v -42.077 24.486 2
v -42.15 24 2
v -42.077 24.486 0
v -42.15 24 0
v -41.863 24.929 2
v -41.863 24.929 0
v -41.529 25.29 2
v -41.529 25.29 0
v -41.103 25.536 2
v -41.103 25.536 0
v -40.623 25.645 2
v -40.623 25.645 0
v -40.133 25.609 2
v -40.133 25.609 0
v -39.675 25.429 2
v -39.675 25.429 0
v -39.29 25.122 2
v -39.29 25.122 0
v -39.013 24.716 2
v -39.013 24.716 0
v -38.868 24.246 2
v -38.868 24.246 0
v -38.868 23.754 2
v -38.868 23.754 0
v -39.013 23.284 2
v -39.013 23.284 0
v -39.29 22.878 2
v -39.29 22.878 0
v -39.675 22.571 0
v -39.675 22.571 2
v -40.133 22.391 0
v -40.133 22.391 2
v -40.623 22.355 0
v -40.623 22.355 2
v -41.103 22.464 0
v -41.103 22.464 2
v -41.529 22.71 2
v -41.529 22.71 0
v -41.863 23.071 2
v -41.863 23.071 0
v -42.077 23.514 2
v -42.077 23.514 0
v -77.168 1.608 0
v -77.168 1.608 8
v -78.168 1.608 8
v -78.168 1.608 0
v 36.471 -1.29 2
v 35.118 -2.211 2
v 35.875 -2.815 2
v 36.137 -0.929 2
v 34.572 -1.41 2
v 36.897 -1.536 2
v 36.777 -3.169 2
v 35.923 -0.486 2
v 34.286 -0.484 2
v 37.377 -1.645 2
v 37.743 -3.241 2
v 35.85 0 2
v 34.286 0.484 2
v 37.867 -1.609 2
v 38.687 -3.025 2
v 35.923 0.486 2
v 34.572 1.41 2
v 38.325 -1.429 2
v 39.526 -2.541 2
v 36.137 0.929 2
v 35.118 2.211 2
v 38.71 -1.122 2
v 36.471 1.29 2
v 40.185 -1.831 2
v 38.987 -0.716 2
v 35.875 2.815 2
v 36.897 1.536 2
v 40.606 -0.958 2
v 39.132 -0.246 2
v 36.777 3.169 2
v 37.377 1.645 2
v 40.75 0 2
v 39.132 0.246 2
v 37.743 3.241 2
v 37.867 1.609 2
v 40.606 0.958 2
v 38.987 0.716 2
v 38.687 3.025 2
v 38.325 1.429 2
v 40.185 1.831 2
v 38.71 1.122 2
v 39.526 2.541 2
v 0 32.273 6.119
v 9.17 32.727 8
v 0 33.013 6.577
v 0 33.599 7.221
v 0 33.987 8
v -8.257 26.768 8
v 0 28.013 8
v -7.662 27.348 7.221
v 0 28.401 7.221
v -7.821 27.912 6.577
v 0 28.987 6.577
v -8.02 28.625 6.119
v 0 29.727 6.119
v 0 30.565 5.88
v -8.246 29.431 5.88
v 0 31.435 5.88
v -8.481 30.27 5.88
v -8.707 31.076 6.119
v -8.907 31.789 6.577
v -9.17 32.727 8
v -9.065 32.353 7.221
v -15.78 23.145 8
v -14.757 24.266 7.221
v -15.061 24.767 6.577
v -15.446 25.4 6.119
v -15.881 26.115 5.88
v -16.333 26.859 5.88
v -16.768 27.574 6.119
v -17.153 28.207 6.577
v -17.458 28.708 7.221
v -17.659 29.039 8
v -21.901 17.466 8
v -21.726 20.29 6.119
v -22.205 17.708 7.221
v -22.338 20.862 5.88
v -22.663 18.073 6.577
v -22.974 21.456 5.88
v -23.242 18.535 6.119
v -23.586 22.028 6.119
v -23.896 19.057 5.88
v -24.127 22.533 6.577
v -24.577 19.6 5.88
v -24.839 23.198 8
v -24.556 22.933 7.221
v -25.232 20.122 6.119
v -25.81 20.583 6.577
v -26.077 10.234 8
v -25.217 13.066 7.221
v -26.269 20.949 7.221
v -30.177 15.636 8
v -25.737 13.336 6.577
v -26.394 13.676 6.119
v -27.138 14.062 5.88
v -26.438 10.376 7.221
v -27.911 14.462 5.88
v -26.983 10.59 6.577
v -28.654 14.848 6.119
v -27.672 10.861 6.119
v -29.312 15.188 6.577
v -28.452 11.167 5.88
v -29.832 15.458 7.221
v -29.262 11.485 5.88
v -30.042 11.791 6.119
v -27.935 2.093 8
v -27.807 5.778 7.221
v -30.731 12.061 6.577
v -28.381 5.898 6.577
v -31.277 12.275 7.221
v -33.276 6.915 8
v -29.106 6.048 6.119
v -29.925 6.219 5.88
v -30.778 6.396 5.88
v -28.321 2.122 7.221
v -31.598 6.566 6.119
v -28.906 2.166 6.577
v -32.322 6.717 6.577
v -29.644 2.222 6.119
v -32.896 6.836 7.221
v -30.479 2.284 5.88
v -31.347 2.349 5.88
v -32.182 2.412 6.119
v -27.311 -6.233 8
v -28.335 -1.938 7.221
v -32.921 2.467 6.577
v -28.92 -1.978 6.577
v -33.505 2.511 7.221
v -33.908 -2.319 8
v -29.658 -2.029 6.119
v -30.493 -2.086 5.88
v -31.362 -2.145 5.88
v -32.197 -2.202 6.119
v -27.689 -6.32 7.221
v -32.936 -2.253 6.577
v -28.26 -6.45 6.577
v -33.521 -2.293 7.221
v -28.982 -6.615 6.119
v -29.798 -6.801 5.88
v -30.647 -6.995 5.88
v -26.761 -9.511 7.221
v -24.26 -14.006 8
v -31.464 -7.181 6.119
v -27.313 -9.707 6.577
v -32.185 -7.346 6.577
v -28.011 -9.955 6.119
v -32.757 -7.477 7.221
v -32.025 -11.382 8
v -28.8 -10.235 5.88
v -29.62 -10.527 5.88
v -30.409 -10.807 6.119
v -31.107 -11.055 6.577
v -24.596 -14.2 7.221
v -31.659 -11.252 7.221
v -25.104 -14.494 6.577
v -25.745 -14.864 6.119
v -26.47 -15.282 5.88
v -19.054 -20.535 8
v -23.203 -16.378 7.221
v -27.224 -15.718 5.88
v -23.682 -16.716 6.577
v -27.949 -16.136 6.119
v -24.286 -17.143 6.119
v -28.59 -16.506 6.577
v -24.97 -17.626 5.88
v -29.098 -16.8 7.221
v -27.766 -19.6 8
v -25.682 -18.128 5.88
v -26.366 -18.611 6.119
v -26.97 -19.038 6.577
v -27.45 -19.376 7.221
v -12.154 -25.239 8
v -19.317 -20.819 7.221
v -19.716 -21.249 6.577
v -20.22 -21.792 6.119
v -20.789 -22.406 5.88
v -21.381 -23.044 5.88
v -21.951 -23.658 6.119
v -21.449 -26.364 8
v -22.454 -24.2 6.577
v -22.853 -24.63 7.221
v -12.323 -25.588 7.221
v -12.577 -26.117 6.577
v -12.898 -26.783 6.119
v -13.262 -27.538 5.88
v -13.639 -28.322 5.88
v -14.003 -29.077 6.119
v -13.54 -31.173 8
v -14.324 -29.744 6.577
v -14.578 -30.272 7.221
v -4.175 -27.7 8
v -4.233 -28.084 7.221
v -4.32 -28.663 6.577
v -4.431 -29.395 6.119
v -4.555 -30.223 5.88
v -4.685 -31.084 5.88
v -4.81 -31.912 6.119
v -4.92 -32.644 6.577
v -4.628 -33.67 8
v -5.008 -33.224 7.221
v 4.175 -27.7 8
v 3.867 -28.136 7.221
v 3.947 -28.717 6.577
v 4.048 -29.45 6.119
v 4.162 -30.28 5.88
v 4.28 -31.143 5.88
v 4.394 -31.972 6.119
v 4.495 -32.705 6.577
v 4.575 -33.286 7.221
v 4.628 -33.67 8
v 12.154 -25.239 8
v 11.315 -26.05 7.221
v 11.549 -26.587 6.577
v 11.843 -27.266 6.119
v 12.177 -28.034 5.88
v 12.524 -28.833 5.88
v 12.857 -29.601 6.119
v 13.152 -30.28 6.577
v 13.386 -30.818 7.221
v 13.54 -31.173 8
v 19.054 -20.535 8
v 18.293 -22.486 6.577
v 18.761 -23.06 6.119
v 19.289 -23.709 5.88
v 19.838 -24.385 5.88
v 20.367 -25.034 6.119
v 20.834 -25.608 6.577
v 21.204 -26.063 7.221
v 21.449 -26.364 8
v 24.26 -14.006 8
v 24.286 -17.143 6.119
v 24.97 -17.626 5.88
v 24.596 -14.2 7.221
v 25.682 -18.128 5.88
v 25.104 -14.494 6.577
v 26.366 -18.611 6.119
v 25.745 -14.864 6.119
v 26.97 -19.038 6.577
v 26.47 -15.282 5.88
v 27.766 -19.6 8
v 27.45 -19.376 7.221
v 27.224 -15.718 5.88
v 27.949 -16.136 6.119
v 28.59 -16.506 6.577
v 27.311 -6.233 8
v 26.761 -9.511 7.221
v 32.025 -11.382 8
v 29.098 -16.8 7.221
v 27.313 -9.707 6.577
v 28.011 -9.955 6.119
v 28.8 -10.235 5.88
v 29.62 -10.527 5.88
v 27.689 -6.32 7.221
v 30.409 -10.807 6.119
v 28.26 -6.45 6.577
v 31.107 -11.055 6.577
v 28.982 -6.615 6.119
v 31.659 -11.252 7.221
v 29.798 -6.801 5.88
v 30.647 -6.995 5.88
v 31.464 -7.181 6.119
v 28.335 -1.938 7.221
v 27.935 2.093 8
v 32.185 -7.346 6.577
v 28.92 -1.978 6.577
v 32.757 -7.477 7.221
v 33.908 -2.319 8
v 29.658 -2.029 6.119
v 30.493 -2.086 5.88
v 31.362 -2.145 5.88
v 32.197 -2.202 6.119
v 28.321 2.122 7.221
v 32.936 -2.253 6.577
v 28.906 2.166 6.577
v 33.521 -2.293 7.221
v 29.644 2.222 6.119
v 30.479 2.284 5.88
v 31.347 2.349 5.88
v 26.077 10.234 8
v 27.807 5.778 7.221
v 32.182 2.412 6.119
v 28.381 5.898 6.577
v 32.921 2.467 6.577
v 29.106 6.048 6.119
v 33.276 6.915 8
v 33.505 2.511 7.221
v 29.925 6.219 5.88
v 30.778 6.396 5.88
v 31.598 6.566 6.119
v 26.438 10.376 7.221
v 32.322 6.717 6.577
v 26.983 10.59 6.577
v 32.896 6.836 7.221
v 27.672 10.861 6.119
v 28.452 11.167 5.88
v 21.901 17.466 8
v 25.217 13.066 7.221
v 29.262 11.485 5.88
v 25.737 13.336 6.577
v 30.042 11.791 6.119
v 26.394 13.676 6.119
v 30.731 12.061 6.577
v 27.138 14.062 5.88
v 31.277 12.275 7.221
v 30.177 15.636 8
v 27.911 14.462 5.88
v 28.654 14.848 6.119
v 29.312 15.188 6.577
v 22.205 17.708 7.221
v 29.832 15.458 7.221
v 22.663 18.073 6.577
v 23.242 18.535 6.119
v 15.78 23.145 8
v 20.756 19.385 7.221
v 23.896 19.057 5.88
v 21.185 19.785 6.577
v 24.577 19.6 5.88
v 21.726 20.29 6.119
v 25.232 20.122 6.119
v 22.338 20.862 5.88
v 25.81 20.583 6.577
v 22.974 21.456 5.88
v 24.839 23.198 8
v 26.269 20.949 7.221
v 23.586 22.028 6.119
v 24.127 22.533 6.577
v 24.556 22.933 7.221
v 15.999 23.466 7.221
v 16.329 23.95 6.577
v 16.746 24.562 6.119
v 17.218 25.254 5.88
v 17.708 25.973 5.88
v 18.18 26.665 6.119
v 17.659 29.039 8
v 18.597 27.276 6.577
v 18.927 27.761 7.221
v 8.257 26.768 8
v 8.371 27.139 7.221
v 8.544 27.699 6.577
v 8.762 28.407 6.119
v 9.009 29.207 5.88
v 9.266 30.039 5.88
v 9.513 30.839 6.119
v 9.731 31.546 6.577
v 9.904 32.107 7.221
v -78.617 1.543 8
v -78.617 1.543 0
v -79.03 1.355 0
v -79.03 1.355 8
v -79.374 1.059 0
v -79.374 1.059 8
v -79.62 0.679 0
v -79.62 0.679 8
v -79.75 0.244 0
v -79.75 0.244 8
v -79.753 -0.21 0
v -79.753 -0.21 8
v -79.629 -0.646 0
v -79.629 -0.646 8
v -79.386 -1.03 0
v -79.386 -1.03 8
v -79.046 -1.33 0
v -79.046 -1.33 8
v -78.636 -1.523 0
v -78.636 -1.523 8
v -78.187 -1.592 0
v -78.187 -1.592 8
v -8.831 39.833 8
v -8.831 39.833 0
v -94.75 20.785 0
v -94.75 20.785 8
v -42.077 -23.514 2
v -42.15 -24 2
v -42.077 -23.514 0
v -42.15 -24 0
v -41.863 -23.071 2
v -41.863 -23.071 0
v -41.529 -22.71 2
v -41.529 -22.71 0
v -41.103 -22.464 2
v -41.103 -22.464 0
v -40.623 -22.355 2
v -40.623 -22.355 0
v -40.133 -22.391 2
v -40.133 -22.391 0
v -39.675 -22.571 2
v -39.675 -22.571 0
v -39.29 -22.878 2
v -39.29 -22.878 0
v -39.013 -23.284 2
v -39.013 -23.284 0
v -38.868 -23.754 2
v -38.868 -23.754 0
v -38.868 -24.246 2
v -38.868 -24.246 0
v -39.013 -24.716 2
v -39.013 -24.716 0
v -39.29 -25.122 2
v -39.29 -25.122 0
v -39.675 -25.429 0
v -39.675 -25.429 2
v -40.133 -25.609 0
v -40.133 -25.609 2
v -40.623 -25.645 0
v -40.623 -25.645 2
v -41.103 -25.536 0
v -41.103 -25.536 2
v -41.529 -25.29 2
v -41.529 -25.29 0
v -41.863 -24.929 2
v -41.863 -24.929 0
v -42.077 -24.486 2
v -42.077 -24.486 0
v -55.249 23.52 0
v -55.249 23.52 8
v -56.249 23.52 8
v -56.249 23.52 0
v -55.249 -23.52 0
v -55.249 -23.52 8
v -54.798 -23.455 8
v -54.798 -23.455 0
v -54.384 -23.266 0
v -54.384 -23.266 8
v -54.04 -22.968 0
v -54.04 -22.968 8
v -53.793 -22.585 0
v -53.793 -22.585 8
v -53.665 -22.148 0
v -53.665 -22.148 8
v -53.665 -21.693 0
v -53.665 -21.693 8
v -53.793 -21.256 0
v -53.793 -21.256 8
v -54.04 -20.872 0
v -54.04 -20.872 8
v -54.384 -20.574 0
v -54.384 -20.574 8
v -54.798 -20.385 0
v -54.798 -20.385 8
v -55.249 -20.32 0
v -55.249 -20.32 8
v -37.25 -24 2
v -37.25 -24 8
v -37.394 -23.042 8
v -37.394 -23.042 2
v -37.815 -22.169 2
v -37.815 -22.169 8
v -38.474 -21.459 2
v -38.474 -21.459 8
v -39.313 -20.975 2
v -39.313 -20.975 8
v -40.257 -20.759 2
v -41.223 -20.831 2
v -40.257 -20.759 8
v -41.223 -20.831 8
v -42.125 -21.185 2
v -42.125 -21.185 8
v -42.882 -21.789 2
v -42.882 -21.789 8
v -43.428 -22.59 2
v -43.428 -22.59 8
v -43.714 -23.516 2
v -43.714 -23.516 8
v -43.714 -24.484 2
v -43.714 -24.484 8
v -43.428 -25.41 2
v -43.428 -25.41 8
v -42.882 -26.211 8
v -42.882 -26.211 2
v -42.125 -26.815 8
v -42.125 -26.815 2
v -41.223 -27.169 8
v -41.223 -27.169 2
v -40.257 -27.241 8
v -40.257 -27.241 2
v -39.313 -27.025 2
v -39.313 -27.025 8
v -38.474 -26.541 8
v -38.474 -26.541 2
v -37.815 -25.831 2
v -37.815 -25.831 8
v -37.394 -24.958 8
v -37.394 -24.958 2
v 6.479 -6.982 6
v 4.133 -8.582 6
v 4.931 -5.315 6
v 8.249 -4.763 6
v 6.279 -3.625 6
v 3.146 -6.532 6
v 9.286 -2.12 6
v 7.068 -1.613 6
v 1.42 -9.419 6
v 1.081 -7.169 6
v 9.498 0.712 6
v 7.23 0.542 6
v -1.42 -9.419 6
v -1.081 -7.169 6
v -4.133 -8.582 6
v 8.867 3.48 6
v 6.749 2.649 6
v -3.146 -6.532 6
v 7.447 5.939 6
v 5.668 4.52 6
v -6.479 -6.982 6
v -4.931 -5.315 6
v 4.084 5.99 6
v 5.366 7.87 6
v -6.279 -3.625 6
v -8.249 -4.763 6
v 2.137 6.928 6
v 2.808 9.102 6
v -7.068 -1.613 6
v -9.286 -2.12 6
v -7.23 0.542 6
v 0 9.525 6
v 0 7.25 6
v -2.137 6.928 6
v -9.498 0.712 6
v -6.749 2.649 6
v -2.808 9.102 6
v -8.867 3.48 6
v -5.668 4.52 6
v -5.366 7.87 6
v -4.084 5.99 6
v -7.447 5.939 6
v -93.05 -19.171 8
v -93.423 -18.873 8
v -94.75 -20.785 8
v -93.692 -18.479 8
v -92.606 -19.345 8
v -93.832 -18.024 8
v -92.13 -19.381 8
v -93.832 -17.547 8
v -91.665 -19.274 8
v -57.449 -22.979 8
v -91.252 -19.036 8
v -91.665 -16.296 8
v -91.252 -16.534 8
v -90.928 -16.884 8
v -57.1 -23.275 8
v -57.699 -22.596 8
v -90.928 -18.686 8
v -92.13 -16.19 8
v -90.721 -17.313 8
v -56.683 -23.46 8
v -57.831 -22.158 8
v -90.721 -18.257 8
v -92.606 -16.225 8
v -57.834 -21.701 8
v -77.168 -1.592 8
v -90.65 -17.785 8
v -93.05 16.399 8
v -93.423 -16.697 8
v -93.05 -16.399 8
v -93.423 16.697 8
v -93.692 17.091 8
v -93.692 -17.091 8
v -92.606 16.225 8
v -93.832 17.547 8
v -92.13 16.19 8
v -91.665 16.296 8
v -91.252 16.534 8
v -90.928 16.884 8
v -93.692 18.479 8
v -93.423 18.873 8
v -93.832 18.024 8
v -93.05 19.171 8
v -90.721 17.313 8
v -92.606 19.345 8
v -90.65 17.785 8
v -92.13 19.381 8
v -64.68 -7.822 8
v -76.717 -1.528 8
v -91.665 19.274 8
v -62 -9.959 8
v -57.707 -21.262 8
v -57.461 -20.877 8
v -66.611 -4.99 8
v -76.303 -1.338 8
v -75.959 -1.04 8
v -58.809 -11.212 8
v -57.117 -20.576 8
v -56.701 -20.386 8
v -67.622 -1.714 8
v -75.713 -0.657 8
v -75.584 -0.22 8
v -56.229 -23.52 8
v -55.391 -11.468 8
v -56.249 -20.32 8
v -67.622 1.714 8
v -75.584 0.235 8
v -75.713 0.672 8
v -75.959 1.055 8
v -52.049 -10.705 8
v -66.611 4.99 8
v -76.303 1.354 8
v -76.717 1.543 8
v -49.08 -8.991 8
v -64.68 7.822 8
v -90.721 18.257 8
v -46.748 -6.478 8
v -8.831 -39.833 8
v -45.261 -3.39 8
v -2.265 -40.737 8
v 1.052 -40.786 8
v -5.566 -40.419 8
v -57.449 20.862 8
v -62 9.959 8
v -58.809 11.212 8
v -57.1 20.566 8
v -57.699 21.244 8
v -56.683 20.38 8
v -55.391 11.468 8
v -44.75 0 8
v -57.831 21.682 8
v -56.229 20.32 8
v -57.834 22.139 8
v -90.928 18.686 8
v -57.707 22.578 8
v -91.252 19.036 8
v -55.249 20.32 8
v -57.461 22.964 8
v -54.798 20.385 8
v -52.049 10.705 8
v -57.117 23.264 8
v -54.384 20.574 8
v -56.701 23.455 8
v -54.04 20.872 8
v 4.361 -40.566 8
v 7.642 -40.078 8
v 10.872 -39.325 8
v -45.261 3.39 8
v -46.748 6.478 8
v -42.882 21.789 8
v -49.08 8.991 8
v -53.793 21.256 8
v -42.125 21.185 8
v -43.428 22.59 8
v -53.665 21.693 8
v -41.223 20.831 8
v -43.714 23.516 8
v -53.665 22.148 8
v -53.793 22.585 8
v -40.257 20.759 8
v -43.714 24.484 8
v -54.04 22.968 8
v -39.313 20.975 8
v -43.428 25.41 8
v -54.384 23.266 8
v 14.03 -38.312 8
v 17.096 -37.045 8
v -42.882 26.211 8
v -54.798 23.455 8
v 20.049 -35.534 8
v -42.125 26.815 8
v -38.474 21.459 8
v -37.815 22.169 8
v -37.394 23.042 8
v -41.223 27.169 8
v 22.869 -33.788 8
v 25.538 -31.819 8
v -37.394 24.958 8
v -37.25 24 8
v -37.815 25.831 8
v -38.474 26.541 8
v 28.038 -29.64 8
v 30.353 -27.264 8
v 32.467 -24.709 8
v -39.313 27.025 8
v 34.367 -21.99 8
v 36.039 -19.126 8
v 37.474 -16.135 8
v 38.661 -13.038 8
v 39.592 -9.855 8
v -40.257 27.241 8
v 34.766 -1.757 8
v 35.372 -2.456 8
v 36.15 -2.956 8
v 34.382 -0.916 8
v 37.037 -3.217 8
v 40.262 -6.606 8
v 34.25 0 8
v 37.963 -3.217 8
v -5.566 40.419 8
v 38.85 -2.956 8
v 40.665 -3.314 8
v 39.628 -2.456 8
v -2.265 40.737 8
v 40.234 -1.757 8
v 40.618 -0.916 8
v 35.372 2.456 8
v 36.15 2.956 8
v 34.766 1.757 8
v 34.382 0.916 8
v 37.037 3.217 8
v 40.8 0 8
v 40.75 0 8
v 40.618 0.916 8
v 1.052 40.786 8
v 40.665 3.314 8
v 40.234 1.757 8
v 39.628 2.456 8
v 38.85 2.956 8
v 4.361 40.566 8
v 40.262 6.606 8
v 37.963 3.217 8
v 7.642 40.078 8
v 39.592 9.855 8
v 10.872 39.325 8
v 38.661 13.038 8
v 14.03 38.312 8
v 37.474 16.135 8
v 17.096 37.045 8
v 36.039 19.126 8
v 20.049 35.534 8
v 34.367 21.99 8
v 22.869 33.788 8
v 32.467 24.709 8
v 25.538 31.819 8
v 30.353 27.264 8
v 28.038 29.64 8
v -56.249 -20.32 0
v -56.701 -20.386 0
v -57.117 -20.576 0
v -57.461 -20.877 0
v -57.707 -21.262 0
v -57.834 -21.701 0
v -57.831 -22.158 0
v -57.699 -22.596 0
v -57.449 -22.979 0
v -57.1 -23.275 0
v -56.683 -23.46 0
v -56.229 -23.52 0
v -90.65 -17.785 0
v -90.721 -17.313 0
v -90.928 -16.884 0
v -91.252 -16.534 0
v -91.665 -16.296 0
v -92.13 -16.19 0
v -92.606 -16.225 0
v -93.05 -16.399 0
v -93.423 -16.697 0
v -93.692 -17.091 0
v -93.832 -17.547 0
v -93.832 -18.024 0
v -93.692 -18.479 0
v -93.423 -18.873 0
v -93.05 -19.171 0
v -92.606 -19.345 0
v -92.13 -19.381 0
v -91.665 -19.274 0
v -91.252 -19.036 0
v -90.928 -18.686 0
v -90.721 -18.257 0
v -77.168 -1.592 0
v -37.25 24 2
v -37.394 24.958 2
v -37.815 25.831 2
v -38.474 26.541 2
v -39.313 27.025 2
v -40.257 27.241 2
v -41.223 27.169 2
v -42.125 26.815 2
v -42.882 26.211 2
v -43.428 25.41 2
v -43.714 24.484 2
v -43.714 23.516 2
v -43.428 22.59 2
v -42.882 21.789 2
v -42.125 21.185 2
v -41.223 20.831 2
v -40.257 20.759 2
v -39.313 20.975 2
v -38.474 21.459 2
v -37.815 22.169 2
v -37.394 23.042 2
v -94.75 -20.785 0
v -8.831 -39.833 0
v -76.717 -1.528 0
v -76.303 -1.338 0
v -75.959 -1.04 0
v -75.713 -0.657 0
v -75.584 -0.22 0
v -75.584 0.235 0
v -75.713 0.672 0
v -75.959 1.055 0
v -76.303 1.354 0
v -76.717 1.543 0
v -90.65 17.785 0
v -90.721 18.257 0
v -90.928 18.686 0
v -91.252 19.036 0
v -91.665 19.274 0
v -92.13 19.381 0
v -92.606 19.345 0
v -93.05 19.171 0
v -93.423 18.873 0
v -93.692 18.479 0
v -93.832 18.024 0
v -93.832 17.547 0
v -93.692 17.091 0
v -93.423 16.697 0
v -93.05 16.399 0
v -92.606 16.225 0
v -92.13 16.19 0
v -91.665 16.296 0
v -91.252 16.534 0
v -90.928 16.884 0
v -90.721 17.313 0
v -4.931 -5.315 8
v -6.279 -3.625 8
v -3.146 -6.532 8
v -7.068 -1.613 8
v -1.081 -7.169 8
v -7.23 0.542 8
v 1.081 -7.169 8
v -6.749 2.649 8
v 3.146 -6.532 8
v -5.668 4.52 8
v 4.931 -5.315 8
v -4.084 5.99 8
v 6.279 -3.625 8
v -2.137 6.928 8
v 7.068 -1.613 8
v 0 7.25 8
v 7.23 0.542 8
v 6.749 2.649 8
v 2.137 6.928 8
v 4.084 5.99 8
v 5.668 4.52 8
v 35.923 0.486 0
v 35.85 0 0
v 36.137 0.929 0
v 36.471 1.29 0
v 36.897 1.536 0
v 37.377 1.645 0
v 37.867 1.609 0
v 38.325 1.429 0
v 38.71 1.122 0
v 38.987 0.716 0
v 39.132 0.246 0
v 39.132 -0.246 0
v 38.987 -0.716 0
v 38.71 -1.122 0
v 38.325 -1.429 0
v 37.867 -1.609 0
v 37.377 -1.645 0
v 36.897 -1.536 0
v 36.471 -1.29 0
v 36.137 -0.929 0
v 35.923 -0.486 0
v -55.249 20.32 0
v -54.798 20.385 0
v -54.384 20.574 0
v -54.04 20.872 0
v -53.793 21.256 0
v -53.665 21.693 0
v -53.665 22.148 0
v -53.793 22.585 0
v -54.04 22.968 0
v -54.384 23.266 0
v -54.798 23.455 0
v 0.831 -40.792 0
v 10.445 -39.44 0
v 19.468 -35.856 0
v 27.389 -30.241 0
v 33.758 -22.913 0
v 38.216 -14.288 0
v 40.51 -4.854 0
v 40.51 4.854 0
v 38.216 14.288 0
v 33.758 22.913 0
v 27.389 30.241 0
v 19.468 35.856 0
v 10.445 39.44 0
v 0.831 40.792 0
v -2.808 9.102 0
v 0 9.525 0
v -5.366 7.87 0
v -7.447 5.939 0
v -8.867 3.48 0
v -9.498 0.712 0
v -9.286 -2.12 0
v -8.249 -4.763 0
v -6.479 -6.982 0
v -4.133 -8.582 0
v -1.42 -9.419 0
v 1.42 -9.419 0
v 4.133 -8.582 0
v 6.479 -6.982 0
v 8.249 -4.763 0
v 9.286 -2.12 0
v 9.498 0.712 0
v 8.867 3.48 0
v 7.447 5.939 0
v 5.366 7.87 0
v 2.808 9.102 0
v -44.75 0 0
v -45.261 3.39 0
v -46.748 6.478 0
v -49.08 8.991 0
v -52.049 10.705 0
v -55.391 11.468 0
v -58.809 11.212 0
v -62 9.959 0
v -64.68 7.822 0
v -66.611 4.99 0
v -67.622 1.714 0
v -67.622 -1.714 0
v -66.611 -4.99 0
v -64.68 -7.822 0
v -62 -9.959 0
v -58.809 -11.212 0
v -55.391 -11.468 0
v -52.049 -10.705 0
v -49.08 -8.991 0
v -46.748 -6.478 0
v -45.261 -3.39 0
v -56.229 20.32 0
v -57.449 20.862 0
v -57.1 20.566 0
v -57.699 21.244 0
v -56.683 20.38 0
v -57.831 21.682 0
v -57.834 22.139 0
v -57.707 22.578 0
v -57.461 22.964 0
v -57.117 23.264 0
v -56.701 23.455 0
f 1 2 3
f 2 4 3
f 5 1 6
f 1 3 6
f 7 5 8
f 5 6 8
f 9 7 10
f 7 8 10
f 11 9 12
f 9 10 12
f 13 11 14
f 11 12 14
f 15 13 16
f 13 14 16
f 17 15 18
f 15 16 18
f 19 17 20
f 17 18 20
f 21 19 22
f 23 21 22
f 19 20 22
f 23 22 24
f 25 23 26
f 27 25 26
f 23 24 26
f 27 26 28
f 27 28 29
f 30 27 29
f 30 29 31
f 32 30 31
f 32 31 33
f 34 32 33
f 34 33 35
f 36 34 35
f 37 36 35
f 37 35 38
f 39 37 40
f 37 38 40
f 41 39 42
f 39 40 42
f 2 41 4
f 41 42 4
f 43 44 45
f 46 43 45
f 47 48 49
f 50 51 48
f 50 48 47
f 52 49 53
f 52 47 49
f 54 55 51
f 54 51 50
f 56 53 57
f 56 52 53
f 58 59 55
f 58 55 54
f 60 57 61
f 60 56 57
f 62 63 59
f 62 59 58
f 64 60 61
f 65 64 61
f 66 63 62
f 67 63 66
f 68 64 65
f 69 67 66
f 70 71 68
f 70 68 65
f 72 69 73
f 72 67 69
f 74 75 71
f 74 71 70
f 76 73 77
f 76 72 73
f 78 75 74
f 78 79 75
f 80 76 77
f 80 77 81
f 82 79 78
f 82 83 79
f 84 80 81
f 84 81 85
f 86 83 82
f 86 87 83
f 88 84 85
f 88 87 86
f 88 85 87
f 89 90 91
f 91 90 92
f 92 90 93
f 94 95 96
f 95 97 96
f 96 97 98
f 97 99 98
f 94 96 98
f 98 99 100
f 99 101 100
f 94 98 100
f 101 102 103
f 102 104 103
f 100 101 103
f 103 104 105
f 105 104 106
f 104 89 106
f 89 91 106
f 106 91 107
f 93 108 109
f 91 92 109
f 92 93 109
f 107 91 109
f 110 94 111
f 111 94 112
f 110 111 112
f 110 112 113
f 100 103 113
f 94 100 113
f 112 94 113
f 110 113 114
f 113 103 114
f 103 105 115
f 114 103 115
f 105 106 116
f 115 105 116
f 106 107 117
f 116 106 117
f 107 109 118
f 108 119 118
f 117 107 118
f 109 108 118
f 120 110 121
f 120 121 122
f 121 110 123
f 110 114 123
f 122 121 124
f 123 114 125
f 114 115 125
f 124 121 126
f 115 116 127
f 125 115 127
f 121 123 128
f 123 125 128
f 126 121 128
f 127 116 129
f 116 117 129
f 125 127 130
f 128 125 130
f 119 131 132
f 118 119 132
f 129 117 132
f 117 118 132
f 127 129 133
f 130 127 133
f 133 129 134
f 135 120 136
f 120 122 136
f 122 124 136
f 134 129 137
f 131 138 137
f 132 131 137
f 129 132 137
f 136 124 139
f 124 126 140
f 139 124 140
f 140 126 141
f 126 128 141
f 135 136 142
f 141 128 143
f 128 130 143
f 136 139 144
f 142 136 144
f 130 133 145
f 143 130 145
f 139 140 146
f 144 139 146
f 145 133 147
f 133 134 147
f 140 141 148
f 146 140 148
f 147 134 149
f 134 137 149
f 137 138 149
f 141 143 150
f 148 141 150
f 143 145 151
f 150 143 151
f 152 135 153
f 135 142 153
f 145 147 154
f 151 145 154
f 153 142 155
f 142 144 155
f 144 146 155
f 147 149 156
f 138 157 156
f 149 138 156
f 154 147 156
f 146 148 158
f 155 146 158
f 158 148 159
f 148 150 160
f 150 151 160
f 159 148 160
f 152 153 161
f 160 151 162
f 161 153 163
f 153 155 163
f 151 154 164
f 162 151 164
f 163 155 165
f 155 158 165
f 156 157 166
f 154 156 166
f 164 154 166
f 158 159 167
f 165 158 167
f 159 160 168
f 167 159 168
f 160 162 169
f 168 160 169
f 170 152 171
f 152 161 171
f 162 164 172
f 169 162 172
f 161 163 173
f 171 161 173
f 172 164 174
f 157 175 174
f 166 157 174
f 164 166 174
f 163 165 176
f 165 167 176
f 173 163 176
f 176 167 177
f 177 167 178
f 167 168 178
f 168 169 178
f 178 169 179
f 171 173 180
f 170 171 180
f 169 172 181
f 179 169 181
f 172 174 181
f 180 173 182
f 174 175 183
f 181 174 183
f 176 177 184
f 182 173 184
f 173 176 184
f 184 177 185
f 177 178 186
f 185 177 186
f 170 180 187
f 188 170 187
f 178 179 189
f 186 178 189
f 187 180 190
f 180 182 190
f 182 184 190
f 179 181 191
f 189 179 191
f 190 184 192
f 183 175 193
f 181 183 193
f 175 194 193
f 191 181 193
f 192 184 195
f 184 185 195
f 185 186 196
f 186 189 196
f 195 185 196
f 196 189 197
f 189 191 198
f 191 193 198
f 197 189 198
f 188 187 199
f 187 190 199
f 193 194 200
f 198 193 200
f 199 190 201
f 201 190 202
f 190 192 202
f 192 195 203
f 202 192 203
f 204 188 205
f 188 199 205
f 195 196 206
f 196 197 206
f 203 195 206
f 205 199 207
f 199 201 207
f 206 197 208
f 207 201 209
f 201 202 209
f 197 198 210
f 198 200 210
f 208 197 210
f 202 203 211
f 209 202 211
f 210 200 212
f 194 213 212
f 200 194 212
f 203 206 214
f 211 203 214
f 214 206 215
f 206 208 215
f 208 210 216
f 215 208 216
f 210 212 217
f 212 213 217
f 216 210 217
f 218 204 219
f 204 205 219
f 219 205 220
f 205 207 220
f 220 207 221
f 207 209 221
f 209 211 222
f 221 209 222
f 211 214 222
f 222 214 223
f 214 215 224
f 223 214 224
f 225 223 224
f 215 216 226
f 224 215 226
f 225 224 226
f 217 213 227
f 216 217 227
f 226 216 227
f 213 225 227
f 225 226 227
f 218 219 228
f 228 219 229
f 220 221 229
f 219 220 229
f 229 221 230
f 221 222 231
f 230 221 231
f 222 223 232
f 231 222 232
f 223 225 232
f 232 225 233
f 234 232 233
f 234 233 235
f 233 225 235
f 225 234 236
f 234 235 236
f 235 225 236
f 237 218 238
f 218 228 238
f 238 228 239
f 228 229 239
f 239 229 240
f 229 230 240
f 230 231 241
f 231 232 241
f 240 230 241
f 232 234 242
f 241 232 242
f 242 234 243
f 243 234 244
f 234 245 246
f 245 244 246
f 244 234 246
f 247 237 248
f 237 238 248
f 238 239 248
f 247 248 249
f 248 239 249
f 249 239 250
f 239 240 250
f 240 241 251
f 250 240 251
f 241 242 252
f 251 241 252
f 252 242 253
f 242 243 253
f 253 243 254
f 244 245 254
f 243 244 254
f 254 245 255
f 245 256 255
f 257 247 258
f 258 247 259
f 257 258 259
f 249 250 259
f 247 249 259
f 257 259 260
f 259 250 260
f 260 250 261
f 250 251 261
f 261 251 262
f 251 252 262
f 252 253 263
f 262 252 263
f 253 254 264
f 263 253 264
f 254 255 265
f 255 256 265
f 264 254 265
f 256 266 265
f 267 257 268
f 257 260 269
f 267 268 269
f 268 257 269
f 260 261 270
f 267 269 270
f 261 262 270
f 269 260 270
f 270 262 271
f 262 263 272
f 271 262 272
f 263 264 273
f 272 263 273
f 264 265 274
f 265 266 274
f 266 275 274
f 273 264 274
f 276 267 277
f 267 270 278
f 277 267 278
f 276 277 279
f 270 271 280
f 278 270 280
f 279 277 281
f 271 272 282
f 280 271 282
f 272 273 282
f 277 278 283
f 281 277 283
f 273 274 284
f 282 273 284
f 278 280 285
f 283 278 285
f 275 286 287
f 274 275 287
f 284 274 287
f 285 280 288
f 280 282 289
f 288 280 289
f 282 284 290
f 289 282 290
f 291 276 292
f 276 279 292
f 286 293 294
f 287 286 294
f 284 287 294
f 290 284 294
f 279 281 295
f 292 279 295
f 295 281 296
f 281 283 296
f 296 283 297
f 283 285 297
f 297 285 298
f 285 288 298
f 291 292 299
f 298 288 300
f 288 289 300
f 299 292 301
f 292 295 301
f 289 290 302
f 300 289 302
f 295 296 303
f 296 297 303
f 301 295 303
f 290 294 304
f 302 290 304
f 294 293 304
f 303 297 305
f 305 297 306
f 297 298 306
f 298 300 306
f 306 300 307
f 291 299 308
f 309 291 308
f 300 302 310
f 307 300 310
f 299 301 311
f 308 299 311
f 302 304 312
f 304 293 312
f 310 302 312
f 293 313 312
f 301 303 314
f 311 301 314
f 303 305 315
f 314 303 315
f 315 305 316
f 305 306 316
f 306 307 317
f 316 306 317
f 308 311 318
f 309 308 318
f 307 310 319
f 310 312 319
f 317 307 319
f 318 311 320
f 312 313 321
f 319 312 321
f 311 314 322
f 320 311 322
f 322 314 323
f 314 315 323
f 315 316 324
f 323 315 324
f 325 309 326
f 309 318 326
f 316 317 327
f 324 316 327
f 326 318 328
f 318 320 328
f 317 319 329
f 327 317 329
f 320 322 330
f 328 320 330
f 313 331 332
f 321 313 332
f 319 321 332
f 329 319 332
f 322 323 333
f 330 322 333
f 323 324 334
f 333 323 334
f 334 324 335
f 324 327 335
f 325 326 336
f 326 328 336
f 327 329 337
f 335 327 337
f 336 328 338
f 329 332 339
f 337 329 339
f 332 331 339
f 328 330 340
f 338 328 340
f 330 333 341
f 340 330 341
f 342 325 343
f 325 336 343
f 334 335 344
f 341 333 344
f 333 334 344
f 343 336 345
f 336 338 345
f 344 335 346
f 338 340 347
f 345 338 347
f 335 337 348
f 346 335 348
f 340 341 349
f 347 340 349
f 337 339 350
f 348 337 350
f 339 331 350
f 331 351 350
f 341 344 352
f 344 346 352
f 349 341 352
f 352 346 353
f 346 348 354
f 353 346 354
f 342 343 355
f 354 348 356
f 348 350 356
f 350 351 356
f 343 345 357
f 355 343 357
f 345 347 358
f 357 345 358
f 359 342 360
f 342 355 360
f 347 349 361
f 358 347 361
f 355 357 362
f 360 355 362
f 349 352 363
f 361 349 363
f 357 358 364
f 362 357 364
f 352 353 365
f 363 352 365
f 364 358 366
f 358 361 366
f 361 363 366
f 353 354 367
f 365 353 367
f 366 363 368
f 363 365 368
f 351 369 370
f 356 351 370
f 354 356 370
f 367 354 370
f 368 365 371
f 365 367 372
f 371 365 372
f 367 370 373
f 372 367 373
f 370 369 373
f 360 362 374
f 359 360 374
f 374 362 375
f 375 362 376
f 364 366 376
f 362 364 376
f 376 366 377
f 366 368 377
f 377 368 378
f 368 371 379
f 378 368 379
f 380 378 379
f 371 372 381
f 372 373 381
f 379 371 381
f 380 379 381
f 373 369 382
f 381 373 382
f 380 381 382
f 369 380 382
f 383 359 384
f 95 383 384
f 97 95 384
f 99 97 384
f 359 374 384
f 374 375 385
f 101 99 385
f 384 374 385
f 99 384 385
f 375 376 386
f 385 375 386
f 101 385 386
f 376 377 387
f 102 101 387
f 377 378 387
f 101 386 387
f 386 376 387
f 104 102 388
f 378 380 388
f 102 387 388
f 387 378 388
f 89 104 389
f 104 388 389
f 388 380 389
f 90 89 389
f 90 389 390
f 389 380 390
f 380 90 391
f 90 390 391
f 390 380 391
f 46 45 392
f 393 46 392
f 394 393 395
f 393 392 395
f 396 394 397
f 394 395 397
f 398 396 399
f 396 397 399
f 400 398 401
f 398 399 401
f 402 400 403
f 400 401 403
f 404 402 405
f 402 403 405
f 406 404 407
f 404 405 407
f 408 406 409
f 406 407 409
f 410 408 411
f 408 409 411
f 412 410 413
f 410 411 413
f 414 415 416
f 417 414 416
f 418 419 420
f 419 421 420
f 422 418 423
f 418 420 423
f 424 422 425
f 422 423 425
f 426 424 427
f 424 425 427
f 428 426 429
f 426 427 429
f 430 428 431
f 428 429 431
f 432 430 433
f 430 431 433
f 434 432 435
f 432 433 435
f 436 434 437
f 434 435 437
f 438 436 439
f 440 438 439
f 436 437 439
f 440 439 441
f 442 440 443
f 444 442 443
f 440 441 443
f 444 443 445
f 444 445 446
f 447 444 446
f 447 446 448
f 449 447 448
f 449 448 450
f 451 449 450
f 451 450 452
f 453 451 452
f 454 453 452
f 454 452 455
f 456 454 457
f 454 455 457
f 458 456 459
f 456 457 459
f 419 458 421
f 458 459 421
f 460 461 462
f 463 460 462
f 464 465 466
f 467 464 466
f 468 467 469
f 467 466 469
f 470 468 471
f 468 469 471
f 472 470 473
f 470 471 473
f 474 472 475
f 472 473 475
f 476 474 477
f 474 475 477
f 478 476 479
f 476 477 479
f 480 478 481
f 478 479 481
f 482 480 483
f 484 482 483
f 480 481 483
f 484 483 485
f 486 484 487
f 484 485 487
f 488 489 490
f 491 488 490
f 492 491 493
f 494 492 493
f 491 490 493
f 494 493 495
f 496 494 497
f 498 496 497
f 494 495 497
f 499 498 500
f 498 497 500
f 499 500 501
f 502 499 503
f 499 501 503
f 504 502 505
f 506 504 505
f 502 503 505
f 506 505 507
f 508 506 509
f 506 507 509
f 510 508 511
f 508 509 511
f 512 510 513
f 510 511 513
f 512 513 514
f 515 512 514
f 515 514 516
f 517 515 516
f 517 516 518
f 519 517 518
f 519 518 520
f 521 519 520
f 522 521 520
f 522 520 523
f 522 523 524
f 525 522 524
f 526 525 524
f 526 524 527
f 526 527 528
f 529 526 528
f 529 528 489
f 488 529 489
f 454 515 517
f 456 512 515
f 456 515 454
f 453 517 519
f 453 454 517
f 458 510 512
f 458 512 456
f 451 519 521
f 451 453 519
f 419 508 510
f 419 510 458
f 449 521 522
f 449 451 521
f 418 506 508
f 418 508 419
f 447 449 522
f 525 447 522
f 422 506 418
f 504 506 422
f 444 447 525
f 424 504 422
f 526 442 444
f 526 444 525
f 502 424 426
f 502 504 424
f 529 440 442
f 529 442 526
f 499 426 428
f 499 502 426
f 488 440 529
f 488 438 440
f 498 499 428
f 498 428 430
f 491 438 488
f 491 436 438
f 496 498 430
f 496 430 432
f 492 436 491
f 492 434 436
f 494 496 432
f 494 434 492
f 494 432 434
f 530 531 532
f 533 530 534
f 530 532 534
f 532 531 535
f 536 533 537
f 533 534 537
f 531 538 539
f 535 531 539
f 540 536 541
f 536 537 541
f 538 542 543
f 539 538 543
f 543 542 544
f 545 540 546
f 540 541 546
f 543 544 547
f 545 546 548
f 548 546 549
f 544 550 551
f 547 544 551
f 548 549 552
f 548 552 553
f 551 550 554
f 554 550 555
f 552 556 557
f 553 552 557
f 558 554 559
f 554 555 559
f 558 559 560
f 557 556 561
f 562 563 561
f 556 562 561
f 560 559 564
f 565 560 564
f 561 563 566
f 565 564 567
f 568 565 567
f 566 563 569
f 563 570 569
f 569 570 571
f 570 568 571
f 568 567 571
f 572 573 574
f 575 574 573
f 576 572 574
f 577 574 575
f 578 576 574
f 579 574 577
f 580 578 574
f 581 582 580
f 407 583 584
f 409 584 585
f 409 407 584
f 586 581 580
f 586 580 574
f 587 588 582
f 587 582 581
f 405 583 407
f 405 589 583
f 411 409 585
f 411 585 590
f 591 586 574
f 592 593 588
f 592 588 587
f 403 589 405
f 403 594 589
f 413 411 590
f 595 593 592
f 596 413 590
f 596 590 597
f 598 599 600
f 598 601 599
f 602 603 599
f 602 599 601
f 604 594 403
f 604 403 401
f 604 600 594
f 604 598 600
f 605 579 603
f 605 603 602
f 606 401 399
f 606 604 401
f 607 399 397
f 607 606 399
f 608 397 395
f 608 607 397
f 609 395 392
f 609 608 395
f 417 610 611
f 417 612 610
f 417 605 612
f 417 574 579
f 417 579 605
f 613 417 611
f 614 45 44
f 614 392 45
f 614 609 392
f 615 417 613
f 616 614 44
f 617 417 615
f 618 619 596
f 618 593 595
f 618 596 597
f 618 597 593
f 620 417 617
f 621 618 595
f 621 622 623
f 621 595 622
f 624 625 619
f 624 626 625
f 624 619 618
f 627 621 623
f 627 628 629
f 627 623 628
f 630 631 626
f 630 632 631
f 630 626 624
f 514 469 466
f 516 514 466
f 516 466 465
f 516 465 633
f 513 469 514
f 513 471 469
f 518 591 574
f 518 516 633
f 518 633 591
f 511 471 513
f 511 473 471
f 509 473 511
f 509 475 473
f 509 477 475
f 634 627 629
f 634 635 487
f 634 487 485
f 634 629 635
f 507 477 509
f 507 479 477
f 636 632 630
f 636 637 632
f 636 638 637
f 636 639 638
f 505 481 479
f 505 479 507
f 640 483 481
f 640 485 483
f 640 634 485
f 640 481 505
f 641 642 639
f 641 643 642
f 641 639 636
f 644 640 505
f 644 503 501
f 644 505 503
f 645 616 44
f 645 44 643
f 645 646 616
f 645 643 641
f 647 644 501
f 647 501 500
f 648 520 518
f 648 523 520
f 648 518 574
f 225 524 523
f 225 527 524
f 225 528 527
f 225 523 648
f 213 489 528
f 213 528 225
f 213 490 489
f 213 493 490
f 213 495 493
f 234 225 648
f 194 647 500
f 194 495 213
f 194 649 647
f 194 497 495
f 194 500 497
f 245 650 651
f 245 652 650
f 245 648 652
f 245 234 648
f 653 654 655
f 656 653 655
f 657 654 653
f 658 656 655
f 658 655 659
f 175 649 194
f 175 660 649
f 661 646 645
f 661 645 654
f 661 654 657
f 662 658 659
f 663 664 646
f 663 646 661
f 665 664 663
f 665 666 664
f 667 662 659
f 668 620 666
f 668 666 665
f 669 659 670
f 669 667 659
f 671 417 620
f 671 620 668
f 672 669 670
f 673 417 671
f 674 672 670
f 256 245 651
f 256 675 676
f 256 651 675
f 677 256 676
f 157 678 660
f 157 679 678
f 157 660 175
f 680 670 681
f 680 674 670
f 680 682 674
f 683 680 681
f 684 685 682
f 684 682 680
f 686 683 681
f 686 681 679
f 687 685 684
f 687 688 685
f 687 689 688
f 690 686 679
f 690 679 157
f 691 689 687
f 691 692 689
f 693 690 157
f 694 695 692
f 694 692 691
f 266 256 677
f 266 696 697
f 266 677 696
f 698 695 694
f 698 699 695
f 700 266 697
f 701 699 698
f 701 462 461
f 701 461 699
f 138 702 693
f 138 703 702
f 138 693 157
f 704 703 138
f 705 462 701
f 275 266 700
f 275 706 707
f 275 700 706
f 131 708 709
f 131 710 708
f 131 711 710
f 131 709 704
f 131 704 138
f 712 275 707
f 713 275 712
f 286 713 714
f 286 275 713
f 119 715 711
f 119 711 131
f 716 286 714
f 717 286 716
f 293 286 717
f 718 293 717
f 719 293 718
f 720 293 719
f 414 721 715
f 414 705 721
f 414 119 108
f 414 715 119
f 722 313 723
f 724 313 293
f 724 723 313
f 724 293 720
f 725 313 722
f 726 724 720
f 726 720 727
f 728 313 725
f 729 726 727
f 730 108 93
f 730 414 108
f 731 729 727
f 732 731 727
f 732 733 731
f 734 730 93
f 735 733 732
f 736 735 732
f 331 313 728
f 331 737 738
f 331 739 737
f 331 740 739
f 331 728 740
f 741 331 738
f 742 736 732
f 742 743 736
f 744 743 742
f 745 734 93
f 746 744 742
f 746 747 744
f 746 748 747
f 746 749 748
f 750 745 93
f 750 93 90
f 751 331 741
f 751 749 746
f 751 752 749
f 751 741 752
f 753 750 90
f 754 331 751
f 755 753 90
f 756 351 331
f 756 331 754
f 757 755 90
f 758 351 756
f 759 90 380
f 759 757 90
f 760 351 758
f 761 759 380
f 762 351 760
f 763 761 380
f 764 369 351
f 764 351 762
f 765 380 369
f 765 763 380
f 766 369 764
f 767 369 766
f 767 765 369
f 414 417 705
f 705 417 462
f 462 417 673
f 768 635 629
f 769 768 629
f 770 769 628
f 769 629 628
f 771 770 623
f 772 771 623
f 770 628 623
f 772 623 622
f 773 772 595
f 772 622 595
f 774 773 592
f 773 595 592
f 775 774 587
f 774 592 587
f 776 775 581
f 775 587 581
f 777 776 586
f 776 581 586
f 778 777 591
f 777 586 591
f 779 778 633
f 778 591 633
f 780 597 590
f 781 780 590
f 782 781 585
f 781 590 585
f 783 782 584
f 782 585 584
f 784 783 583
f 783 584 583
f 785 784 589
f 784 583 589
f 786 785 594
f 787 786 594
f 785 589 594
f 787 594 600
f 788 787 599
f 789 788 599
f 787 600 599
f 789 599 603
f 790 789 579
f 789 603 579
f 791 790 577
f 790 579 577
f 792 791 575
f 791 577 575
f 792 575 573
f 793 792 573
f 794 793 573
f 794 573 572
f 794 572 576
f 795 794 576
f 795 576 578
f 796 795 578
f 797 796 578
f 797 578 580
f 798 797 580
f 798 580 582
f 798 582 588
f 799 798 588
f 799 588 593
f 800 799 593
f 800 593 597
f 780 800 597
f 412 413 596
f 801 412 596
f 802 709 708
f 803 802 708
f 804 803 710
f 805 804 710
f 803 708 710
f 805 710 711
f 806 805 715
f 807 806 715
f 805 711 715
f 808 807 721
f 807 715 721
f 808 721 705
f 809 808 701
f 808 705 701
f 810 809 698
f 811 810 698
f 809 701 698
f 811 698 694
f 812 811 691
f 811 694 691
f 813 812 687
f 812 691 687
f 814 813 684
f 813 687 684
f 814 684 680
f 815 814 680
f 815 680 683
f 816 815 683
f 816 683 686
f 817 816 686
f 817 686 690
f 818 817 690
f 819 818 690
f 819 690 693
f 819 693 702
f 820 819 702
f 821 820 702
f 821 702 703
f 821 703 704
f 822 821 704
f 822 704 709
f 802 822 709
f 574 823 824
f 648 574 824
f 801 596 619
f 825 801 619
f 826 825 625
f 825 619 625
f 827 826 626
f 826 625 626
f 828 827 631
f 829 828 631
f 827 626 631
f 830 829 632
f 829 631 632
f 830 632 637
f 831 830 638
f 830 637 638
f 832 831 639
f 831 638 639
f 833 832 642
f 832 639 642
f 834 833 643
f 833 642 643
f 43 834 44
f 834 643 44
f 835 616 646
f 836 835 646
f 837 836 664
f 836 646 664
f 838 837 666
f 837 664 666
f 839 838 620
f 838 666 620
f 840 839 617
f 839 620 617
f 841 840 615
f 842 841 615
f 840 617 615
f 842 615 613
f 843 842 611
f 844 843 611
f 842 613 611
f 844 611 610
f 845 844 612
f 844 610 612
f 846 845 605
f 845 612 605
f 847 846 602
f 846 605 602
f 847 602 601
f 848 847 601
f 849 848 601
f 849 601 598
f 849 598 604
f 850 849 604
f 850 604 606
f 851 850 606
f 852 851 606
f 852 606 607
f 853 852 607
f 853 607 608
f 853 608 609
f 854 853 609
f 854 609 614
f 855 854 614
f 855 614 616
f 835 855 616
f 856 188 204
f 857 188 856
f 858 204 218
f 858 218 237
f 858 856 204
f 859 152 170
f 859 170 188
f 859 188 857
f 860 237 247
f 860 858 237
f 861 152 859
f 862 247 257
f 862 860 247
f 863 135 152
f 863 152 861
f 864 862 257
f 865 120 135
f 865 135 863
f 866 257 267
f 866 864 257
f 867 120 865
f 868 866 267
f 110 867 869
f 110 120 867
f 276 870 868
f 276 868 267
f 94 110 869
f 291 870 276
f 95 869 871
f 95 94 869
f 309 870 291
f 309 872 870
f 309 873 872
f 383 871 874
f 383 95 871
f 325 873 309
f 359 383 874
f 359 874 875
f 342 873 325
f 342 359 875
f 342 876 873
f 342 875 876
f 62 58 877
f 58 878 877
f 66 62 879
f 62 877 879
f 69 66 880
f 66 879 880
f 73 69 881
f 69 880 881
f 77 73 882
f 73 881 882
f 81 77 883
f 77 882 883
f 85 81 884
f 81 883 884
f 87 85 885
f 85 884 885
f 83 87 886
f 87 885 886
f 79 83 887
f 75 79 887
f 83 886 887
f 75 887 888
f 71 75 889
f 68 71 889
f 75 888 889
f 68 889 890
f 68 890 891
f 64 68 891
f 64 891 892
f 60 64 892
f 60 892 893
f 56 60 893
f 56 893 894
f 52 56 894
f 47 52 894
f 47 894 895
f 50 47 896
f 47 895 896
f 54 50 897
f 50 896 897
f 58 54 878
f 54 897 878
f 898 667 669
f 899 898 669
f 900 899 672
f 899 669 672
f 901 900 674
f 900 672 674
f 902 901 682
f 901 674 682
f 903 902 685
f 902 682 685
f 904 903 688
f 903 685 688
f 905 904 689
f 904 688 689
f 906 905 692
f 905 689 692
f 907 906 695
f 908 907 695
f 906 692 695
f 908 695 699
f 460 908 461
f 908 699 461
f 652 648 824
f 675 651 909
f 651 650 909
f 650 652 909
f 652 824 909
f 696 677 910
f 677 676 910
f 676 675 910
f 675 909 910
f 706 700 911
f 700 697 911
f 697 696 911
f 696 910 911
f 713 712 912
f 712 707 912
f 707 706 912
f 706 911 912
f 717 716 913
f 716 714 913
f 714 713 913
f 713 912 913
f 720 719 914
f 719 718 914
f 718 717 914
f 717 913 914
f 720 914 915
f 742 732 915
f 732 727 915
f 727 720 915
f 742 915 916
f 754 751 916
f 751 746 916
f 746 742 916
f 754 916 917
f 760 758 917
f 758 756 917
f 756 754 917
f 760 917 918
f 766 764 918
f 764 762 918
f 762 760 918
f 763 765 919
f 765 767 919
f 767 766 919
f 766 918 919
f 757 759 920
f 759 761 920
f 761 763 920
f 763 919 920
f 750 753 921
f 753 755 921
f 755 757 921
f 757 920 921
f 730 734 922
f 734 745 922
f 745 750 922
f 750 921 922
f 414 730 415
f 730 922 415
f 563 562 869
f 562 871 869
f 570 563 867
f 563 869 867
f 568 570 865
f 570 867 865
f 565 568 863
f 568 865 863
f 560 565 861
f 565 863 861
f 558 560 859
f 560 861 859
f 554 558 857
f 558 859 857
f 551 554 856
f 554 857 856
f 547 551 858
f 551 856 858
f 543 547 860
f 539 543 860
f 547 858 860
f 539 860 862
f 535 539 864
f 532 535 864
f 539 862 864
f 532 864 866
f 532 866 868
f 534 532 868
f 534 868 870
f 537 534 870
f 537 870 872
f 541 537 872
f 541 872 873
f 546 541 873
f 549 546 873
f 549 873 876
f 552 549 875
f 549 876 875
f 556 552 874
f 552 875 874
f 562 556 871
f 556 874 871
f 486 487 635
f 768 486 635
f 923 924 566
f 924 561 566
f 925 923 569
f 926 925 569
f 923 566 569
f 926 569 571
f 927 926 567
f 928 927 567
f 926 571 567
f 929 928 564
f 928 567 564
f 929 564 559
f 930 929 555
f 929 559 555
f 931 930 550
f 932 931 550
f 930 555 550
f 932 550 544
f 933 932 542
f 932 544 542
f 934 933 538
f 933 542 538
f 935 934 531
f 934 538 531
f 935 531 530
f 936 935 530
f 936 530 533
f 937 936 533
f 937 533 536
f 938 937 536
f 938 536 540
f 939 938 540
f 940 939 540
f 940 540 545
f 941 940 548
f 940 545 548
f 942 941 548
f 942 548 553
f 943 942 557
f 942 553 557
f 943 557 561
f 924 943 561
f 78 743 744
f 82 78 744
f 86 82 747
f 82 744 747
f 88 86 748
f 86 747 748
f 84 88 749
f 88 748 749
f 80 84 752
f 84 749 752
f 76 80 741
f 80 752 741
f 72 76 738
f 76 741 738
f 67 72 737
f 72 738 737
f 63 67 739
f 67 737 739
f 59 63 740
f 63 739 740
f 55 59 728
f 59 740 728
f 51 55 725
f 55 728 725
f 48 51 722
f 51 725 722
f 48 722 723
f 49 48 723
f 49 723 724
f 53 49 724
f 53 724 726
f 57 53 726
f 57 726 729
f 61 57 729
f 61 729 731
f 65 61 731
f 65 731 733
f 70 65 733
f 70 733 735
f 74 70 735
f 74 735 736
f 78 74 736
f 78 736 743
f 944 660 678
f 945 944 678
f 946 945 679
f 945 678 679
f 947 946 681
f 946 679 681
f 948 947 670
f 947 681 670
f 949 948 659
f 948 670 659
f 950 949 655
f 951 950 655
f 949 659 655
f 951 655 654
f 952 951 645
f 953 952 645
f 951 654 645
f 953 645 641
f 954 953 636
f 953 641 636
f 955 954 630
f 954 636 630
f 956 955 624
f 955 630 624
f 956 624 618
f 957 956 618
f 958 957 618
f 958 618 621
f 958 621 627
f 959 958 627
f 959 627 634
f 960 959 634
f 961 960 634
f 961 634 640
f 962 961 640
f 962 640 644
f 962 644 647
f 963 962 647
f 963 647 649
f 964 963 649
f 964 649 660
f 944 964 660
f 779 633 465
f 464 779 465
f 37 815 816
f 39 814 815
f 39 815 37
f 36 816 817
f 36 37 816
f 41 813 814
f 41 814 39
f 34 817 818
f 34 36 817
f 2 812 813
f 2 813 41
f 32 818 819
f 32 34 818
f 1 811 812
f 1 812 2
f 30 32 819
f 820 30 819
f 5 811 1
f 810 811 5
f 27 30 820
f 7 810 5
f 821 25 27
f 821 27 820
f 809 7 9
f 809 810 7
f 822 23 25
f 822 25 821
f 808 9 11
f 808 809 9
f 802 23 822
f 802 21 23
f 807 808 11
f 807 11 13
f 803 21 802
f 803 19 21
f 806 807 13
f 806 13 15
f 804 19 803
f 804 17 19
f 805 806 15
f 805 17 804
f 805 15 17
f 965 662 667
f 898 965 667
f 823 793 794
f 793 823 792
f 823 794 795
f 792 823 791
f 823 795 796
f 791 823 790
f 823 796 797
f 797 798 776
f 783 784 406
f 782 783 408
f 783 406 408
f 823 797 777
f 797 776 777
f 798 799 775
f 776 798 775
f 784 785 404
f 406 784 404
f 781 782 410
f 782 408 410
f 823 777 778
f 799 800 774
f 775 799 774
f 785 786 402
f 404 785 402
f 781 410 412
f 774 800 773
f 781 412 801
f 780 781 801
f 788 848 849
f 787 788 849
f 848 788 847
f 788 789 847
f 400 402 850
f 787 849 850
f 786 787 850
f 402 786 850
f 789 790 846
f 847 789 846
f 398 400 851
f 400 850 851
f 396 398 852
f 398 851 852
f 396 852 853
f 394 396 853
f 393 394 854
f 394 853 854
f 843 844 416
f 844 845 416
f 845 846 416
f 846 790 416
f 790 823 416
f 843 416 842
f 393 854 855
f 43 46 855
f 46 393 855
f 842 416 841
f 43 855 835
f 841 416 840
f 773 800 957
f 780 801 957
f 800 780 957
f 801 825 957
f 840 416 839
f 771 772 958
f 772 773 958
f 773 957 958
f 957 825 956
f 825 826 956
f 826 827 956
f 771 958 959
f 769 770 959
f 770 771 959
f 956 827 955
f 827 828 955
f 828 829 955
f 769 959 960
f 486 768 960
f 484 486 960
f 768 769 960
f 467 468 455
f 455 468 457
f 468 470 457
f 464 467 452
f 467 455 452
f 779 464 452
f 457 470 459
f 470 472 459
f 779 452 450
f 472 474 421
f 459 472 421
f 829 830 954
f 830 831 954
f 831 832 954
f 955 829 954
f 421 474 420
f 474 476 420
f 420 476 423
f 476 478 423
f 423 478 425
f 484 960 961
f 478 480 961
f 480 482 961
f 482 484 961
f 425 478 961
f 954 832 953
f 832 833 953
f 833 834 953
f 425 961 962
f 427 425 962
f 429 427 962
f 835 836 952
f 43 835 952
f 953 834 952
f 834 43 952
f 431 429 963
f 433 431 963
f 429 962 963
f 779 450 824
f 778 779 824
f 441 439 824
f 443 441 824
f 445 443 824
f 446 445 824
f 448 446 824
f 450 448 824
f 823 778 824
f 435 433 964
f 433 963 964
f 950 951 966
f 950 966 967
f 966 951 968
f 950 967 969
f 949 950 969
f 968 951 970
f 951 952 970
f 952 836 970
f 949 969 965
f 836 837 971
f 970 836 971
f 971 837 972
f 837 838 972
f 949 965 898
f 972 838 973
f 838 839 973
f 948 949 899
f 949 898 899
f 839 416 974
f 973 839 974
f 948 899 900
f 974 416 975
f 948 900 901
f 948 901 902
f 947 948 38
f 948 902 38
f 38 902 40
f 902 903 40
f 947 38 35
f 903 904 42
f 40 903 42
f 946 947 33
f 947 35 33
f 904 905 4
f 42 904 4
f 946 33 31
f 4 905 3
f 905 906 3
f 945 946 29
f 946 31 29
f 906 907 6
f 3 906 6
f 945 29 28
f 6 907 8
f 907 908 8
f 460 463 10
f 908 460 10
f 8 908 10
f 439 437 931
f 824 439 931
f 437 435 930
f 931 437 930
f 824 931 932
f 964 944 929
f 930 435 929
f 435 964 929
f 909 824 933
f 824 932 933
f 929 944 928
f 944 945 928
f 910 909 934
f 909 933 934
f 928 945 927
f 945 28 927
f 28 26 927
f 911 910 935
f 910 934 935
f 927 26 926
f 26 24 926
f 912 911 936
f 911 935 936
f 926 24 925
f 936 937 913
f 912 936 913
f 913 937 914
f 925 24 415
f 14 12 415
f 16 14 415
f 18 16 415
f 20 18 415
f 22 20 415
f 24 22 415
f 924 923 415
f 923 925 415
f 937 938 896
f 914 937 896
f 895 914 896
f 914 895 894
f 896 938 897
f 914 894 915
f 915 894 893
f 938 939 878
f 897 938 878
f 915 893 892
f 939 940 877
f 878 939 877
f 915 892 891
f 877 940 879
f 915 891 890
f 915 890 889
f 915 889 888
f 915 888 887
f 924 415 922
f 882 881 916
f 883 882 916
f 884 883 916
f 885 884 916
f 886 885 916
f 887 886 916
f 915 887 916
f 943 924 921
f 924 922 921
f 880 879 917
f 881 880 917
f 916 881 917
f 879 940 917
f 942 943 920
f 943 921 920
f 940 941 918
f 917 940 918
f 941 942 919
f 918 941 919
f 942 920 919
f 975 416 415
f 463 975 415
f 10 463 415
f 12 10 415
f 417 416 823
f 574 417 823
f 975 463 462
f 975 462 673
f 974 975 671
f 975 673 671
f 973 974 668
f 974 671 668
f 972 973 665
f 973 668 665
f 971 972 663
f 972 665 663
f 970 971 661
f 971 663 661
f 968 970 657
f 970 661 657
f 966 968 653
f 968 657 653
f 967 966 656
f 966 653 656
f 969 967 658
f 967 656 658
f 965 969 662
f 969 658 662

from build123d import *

# Parameters (mm, degrees)
F0_R            = 40.8
F1_DEPTH        = 8
F4_R            = 3.15
F6_W            = 4.8
F6_H            = 38.4
F7_DEPTH        = 8.001
F9_DEPTH        = 8
F10_R           = 11.5
F10_R_2         = 1.6
F11_DEPTH       = 8.001
F13_D           = 3.3
F13_CBORE_D     = 6.5
F13_CBORE_DEPTH = 6


# Not quite as in the source:
# - a feature names something its author has since deleted; it is built from what else it names


with BuildPart() as f1:
    # F0 (on Top) → F1 (new body)
    with BuildSketch(Plane.XY):
        Circle(F0_R)
    extrude(amount=F1_DEPTH)

    # F2 (on Right) → F3 (revolve, cut)
    with BuildSketch(Plane.YZ):
        Polygon((0, 8), (0, 0), (9.525, 0), (9.525, 6), (7.25, 6), (7.25, 8), align=None)
    revolve(axis=Axis((0, 0, 10.7360328796), (0, 0, 1)), mode=Mode.SUBTRACT)

    # F4 (on Right) → F5 (revolve, cut)
    with BuildSketch(Plane.YZ):
        with Locations((31, 9)):
            Circle(F4_R)
    revolve(axis=Axis((0, 0, 6.3867427816), (0, 0, 1)), mode=Mode.SUBTRACT)

    # F6 (on Top) → F7 (cut, through all)
    with BuildSketch(Plane.XY):
        with Locations((-38.4, 0)):
            Rectangle(F6_W, F6_H)
    extrude(amount=F7_DEPTH, mode=Mode.SUBTRACT)

    # F8 (on Top) → F9 (join, through all)
    with BuildSketch(Plane.XY):
        with BuildLine():
            Line((-94.75, 20.7850348986), (-94.75, -20.7850348986))
            Line((-94.75, -20.7850348986), (-8.8307362487, -39.8328770905))
            ThreePointArc((-8.8307362487, -39.8328770905), (-24.6754459414, -32.4924970969), (-36, -19.2))
            Line((-36, -19.2), (-36, 19.2))
            ThreePointArc((-36, 19.2), (-24.6754459414, 32.4924970969), (-8.8307362487, 39.8328770905))
            Line((-8.8307362487, 39.8328770905), (-94.75, 20.7850348986))
        make_face()
    extrude(amount=F9_DEPTH)

    # F10 (on face) → F11 (cut, through all)
    with BuildSketch(Plane.XY.offset(8)):
        with Locations((-56.25, 0)):
            Circle(F10_R)
        with Locations((-92.25, 17.7850348986)):
            Circle(F10_R_2)
        with Locations((-92.25, -17.7850348986)):
            Circle(F10_R_2)
        with BuildLine():
            Line((-55.2488153952, 23.5201616153), (-56.2488153952, 23.5201616153))
            ThreePointArc((-56.2488153952, 23.5201616153), (-57.848786069, 21.9104743704), (-56.2294412604, 20.3202789187))
            Line((-56.2294412604, 20.3202789187), (-55.2488153952, 20.3202789187))
            ThreePointArc((-55.2488153952, 20.3202789187), (-53.6488740469, 21.920220267), (-55.2488153952, 23.5201616153))
        make_face()
        with BuildLine():
            Line((-77.1680206657, 1.6075620275), (-78.1680206657, 1.6075620275))
            ThreePointArc((-78.1680206657, 1.6075620275), (-79.7679913396, 0.0172492724), (-78.1873948004, -1.5923206691))
            Line((-78.1873948004, -1.5923206691), (-77.1680206657, -1.5923206691))
            ThreePointArc((-77.1680206657, -1.5923206691), (-75.5680793174, 0.0076206792), (-77.1680206657, 1.6075620275))
        make_face()
        with BuildLine():
            Line((-55.2488164927, -20.3202952302), (-56.2488164927, -20.3202952302))
            ThreePointArc((-56.2488164927, -20.3202952302), (-57.8487871666, -21.9299824752), (-56.229442358, -23.5201779268))
            Line((-56.229442358, -23.5201779268), (-55.2488164927, -23.5201779268))
            ThreePointArc((-55.2488164927, -23.5201779268), (-53.6488751444, -21.9202365785), (-55.2488164927, -20.3202952302))
        make_face()
    extrude(amount=-F11_DEPTH, mode=Mode.SUBTRACT)

    # F13 (through all)
    with Locations(Plane.XY.offset(8)):
        with Locations((-40.5, 24), (-40.5, -24), (37.5, 0)):
            CounterBoreHole(F13_D / 2, F13_CBORE_D / 2, F13_CBORE_DEPTH)


solid = f1.part
